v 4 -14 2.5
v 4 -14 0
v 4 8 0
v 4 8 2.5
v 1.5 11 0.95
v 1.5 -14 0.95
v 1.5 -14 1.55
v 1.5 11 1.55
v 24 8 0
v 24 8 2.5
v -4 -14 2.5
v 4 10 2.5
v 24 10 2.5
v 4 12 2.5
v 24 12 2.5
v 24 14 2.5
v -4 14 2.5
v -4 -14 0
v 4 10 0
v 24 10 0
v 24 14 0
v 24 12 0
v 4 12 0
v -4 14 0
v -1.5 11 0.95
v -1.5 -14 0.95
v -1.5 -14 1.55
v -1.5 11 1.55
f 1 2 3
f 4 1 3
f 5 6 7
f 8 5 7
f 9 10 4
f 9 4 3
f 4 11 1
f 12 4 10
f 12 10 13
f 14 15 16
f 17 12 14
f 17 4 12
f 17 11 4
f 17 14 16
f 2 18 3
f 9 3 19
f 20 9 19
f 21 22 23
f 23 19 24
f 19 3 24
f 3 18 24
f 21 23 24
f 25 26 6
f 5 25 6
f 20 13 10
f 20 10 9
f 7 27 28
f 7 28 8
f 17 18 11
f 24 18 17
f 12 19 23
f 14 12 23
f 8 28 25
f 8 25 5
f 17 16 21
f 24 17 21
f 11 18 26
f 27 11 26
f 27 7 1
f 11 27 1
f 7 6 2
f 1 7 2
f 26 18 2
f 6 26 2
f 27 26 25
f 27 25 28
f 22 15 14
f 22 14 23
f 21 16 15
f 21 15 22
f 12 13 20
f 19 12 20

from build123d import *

# Parameters (mm, degrees)
ESBO_O2_W                = 8
ESBO_O2_H                = 28
RESSALTO_EXTRUS_O1_DEPTH = 2.5
ESBO_O3_W                = 3
ESBO_O3_H                = 0.6
CORTE_EXTRUS_O1_DEPTH    = 25
ESBO_O4_W                = 2.5
ESBO_O4_H                = 2
RESSALTO_EXTRUS_O2_DEPTH = 20


with BuildPart() as part:
    # Esboço2 → Ressalto-extrusão1 (new body)
    with BuildSketch(Plane.XY):
        Rectangle(ESBO_O2_W, ESBO_O2_H)
    extrude(amount=RESSALTO_EXTRUS_O1_DEPTH)

    # Esboço3 → Corte-extrusão1 (cut)
    with BuildSketch(Plane.XZ.offset(14)):
        with Locations((0, 1.25)):
            Rectangle(ESBO_O3_W, ESBO_O3_H)
    extrude(amount=-CORTE_EXTRUS_O1_DEPTH, mode=Mode.SUBTRACT)

    # Esboço4 → Ressalto-extrusão2 (add)
    with BuildSketch(Plane(origin=(4, 0, 0), x_dir=(0, 0, -1), z_dir=(1, 0, 0))):
        with Locations((-1.25, 13)):
            Rectangle(ESBO_O4_W, ESBO_O4_H)
        with Locations((-1.25, 9)):
            Rectangle(ESBO_O4_W, ESBO_O4_H)
    extrude(amount=RESSALTO_EXTRUS_O2_DEPTH)


solid = part.part
